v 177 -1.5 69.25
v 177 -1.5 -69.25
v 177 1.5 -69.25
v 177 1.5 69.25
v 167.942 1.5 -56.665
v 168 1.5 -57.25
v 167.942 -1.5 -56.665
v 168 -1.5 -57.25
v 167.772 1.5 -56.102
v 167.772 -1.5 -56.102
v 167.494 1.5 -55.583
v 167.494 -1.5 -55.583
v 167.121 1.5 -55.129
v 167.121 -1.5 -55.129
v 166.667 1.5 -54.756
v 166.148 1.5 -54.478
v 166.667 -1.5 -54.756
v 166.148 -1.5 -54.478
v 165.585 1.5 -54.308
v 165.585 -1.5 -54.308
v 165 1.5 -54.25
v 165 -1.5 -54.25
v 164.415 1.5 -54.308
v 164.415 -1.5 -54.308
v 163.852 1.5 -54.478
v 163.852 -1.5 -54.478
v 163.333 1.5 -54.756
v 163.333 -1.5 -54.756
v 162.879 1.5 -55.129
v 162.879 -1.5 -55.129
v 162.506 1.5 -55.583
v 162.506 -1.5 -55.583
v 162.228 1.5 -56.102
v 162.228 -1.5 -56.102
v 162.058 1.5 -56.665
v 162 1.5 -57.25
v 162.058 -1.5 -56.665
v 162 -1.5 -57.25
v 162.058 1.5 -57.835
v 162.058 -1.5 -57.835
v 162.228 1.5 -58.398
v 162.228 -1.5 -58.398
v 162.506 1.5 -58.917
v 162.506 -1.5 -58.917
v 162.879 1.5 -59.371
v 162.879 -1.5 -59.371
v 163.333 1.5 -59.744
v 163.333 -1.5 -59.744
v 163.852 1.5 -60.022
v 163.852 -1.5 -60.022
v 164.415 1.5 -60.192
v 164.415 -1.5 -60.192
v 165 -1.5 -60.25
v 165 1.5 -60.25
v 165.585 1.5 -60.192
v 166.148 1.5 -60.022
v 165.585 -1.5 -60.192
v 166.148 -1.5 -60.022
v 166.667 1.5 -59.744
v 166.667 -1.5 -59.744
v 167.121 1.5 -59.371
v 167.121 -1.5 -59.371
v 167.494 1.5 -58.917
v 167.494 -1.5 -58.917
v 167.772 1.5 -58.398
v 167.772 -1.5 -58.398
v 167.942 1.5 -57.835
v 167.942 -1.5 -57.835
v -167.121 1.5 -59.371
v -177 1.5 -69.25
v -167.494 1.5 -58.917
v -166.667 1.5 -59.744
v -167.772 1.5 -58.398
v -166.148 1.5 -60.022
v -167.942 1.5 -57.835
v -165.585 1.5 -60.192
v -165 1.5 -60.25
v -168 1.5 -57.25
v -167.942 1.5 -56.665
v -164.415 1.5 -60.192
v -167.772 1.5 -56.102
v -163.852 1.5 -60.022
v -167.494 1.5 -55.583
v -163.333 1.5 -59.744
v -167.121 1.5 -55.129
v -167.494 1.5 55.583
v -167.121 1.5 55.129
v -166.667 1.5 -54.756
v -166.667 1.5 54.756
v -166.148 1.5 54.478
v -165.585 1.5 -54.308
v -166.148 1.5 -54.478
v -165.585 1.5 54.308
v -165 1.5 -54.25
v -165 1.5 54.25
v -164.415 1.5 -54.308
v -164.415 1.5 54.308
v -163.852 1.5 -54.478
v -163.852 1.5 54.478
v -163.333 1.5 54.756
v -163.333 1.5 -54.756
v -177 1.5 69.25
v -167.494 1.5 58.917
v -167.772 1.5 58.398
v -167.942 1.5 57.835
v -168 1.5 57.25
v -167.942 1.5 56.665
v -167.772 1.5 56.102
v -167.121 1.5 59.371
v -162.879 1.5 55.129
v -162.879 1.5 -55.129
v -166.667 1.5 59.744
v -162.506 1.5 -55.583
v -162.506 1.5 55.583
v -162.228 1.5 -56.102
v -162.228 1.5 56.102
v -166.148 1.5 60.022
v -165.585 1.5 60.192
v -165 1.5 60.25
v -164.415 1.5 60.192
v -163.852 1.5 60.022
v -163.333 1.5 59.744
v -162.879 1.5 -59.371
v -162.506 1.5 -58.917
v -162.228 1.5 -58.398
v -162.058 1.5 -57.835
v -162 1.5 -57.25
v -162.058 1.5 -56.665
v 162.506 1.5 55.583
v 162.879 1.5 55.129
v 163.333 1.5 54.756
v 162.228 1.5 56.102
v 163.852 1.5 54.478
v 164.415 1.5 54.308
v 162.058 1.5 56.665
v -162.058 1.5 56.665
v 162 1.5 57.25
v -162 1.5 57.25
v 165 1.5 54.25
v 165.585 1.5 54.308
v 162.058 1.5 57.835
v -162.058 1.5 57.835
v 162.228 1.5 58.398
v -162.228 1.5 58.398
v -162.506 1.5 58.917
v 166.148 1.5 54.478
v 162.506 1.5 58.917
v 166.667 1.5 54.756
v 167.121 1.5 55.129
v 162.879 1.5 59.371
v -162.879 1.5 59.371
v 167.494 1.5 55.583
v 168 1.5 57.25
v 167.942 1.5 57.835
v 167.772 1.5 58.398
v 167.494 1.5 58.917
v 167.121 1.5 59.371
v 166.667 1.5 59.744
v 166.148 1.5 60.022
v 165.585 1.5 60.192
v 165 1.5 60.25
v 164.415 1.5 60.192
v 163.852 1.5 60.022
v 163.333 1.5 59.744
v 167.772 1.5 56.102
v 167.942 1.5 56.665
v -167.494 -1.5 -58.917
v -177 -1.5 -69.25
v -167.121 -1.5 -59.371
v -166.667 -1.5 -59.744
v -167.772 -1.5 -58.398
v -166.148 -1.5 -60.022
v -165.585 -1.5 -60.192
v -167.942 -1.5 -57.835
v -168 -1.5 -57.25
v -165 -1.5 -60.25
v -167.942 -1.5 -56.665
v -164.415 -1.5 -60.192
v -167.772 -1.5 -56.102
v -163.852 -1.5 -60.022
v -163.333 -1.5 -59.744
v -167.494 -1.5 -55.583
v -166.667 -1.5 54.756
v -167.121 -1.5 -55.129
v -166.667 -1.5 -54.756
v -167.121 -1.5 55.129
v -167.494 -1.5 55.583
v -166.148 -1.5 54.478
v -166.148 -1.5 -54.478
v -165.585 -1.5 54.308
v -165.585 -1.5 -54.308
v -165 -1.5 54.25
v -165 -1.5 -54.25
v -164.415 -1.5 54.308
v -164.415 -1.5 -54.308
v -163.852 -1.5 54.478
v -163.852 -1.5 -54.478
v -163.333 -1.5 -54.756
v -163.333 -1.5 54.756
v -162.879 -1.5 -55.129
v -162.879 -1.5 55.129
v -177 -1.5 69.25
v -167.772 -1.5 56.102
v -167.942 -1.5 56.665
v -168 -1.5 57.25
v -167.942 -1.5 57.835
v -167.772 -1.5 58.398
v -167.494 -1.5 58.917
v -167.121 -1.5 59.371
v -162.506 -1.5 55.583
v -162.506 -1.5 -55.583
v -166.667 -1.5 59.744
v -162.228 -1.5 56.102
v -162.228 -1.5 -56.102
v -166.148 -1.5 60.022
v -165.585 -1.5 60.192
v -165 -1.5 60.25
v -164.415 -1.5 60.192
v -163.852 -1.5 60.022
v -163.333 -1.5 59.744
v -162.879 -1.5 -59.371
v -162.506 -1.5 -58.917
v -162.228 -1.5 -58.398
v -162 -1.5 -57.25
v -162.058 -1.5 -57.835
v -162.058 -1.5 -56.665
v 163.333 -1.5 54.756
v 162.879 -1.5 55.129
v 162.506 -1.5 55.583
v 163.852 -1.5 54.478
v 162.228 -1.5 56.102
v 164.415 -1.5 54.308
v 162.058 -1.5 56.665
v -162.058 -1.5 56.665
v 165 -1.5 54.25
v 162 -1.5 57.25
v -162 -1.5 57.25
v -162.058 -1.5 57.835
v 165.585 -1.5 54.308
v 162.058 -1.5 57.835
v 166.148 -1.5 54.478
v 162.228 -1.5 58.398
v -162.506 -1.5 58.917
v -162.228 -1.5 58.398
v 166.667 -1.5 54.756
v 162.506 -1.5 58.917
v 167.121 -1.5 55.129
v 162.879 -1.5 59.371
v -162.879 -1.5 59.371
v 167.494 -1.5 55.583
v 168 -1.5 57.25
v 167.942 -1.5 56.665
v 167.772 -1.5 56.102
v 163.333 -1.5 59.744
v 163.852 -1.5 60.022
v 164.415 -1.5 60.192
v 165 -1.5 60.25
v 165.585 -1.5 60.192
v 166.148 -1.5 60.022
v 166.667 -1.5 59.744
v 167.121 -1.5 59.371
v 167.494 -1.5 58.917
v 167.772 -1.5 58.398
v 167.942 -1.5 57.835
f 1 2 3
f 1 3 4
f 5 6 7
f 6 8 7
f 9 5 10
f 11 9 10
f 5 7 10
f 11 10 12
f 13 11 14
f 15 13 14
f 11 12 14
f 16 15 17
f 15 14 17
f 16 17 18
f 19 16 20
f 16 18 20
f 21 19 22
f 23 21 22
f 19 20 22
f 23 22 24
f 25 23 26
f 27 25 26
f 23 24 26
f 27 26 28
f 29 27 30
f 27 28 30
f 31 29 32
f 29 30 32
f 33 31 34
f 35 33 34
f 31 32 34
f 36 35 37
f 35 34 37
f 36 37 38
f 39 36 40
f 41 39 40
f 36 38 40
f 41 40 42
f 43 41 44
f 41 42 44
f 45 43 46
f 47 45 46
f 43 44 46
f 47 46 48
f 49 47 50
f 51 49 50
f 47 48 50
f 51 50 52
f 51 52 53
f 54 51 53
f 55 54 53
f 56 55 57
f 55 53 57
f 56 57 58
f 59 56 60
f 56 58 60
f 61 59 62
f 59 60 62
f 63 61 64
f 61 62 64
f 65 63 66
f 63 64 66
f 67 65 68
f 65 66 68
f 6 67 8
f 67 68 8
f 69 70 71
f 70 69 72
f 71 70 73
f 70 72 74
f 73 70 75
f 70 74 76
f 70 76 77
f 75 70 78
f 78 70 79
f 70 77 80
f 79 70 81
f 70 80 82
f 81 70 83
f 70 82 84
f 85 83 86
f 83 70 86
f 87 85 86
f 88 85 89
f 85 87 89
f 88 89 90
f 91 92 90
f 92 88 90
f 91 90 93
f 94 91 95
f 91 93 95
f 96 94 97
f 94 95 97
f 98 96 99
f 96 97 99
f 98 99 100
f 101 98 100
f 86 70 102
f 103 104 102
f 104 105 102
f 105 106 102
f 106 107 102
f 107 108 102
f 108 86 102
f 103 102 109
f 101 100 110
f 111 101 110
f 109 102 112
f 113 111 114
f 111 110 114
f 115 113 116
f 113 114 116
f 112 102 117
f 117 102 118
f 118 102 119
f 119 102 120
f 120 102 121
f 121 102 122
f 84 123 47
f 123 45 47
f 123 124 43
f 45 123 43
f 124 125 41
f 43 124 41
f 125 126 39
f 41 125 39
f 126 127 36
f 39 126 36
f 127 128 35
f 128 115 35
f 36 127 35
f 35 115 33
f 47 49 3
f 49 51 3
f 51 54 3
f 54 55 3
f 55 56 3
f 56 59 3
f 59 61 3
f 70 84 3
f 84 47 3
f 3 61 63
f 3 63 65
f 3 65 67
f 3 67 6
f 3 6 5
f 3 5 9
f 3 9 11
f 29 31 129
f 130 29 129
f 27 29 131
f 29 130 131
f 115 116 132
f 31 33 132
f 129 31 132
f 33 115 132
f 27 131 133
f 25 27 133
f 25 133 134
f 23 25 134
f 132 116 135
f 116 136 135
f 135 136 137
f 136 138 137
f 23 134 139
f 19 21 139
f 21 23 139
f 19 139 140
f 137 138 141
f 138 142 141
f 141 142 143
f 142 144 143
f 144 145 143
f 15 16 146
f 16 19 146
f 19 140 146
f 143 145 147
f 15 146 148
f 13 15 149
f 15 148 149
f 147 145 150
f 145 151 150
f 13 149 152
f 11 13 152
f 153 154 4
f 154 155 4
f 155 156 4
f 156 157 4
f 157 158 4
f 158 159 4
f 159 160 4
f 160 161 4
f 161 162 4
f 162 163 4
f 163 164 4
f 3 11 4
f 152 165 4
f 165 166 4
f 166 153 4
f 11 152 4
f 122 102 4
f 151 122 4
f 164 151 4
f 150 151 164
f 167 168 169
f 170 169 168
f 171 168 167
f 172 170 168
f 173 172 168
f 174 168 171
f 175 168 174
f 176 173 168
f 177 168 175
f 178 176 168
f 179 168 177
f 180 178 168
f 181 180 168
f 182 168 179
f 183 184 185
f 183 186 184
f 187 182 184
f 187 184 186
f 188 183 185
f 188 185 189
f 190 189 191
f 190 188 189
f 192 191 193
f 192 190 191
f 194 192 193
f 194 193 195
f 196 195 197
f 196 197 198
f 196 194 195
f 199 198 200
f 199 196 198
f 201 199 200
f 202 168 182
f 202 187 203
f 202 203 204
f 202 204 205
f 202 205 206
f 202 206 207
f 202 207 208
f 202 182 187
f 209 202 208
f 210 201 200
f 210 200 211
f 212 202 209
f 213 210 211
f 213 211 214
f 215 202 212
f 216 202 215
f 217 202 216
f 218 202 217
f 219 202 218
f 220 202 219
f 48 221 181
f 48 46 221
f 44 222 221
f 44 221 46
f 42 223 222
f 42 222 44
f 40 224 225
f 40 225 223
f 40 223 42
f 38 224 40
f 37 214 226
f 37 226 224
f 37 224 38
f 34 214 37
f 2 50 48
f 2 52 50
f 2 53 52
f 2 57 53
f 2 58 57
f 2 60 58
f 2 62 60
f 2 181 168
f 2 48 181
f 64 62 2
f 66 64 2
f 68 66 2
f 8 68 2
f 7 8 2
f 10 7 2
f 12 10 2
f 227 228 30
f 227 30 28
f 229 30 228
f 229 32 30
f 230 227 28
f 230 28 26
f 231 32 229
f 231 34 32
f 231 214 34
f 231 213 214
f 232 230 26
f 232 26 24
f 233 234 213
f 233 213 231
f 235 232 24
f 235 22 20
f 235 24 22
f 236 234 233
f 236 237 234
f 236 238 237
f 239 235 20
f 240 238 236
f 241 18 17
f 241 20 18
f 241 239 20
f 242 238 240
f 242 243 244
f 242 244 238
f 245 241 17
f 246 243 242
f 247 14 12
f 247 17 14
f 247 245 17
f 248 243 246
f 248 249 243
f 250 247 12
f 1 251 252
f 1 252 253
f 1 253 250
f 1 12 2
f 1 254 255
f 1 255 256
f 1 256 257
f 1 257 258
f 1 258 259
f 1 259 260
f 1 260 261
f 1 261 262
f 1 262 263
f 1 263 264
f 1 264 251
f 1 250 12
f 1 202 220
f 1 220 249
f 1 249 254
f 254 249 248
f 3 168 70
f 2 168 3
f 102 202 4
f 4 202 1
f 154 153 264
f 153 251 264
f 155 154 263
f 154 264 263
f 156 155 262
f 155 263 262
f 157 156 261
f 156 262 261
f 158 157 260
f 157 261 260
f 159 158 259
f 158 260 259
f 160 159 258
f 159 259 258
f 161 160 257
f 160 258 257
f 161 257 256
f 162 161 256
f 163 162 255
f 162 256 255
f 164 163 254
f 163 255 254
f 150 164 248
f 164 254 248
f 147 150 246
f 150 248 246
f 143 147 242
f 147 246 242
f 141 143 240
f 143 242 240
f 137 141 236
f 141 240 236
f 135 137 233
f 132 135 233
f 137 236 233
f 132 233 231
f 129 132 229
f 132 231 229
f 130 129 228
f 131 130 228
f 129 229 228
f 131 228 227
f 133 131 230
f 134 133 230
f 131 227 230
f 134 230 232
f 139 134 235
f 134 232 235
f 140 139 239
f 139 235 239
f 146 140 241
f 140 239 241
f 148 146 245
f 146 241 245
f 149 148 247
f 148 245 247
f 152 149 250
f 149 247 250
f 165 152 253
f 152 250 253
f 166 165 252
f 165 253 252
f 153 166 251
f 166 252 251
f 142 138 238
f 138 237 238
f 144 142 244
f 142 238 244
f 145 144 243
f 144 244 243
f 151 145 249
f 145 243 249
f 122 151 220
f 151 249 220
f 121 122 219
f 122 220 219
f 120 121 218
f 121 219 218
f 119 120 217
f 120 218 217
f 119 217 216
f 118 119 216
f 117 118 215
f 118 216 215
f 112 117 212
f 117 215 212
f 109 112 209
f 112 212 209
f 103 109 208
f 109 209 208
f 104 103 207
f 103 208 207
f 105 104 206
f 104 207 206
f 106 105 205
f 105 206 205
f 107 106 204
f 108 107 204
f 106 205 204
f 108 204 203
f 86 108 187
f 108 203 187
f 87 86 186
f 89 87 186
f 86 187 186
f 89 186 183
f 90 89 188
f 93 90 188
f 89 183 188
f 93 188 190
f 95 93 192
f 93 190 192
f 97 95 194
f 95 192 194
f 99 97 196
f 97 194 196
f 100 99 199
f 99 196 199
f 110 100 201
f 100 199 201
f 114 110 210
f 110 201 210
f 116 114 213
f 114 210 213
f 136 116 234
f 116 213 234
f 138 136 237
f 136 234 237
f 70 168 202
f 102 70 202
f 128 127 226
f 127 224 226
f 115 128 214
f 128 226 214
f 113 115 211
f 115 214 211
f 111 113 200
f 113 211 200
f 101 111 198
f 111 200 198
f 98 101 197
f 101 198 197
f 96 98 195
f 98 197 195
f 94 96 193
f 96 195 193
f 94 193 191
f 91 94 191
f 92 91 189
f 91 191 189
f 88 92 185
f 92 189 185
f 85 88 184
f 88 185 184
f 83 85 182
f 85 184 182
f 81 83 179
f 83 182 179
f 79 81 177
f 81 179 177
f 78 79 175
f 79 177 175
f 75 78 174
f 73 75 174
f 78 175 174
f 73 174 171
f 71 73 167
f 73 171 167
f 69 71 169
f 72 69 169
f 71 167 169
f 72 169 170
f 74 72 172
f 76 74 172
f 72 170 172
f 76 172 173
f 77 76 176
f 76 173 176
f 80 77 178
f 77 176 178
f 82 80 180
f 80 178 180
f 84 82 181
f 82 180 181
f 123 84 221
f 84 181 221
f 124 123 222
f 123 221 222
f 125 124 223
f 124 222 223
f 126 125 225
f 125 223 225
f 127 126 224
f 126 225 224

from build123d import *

# Parameters (mm, degrees)
F0_W     = 354
F0_H     = 138.5
F1_DEPTH = 1.5
F2_R     = 3
F3_DEPTH = 12.5


with BuildPart() as f1:
    # F0 (on Front) → F1 (new body, symmetric)
    with BuildSketch(Plane.XZ):
        Rectangle(F0_W, F0_H)
    extrude(amount=F1_DEPTH, both=True)

    # F2 (on Front) → F3 (cut, symmetric)
    with BuildSketch(Plane.XZ):
        with Locations((-165, 57.25)):
            Circle(F2_R)
        with Locations((-165, -57.25)):
            Circle(F2_R)
        with Locations((165, 57.25)):
            Circle(F2_R)
        with Locations((165, -57.25)):
            Circle(F2_R)
    extrude(amount=F3_DEPTH, both=True, mode=Mode.SUBTRACT)


solid = f1.part
